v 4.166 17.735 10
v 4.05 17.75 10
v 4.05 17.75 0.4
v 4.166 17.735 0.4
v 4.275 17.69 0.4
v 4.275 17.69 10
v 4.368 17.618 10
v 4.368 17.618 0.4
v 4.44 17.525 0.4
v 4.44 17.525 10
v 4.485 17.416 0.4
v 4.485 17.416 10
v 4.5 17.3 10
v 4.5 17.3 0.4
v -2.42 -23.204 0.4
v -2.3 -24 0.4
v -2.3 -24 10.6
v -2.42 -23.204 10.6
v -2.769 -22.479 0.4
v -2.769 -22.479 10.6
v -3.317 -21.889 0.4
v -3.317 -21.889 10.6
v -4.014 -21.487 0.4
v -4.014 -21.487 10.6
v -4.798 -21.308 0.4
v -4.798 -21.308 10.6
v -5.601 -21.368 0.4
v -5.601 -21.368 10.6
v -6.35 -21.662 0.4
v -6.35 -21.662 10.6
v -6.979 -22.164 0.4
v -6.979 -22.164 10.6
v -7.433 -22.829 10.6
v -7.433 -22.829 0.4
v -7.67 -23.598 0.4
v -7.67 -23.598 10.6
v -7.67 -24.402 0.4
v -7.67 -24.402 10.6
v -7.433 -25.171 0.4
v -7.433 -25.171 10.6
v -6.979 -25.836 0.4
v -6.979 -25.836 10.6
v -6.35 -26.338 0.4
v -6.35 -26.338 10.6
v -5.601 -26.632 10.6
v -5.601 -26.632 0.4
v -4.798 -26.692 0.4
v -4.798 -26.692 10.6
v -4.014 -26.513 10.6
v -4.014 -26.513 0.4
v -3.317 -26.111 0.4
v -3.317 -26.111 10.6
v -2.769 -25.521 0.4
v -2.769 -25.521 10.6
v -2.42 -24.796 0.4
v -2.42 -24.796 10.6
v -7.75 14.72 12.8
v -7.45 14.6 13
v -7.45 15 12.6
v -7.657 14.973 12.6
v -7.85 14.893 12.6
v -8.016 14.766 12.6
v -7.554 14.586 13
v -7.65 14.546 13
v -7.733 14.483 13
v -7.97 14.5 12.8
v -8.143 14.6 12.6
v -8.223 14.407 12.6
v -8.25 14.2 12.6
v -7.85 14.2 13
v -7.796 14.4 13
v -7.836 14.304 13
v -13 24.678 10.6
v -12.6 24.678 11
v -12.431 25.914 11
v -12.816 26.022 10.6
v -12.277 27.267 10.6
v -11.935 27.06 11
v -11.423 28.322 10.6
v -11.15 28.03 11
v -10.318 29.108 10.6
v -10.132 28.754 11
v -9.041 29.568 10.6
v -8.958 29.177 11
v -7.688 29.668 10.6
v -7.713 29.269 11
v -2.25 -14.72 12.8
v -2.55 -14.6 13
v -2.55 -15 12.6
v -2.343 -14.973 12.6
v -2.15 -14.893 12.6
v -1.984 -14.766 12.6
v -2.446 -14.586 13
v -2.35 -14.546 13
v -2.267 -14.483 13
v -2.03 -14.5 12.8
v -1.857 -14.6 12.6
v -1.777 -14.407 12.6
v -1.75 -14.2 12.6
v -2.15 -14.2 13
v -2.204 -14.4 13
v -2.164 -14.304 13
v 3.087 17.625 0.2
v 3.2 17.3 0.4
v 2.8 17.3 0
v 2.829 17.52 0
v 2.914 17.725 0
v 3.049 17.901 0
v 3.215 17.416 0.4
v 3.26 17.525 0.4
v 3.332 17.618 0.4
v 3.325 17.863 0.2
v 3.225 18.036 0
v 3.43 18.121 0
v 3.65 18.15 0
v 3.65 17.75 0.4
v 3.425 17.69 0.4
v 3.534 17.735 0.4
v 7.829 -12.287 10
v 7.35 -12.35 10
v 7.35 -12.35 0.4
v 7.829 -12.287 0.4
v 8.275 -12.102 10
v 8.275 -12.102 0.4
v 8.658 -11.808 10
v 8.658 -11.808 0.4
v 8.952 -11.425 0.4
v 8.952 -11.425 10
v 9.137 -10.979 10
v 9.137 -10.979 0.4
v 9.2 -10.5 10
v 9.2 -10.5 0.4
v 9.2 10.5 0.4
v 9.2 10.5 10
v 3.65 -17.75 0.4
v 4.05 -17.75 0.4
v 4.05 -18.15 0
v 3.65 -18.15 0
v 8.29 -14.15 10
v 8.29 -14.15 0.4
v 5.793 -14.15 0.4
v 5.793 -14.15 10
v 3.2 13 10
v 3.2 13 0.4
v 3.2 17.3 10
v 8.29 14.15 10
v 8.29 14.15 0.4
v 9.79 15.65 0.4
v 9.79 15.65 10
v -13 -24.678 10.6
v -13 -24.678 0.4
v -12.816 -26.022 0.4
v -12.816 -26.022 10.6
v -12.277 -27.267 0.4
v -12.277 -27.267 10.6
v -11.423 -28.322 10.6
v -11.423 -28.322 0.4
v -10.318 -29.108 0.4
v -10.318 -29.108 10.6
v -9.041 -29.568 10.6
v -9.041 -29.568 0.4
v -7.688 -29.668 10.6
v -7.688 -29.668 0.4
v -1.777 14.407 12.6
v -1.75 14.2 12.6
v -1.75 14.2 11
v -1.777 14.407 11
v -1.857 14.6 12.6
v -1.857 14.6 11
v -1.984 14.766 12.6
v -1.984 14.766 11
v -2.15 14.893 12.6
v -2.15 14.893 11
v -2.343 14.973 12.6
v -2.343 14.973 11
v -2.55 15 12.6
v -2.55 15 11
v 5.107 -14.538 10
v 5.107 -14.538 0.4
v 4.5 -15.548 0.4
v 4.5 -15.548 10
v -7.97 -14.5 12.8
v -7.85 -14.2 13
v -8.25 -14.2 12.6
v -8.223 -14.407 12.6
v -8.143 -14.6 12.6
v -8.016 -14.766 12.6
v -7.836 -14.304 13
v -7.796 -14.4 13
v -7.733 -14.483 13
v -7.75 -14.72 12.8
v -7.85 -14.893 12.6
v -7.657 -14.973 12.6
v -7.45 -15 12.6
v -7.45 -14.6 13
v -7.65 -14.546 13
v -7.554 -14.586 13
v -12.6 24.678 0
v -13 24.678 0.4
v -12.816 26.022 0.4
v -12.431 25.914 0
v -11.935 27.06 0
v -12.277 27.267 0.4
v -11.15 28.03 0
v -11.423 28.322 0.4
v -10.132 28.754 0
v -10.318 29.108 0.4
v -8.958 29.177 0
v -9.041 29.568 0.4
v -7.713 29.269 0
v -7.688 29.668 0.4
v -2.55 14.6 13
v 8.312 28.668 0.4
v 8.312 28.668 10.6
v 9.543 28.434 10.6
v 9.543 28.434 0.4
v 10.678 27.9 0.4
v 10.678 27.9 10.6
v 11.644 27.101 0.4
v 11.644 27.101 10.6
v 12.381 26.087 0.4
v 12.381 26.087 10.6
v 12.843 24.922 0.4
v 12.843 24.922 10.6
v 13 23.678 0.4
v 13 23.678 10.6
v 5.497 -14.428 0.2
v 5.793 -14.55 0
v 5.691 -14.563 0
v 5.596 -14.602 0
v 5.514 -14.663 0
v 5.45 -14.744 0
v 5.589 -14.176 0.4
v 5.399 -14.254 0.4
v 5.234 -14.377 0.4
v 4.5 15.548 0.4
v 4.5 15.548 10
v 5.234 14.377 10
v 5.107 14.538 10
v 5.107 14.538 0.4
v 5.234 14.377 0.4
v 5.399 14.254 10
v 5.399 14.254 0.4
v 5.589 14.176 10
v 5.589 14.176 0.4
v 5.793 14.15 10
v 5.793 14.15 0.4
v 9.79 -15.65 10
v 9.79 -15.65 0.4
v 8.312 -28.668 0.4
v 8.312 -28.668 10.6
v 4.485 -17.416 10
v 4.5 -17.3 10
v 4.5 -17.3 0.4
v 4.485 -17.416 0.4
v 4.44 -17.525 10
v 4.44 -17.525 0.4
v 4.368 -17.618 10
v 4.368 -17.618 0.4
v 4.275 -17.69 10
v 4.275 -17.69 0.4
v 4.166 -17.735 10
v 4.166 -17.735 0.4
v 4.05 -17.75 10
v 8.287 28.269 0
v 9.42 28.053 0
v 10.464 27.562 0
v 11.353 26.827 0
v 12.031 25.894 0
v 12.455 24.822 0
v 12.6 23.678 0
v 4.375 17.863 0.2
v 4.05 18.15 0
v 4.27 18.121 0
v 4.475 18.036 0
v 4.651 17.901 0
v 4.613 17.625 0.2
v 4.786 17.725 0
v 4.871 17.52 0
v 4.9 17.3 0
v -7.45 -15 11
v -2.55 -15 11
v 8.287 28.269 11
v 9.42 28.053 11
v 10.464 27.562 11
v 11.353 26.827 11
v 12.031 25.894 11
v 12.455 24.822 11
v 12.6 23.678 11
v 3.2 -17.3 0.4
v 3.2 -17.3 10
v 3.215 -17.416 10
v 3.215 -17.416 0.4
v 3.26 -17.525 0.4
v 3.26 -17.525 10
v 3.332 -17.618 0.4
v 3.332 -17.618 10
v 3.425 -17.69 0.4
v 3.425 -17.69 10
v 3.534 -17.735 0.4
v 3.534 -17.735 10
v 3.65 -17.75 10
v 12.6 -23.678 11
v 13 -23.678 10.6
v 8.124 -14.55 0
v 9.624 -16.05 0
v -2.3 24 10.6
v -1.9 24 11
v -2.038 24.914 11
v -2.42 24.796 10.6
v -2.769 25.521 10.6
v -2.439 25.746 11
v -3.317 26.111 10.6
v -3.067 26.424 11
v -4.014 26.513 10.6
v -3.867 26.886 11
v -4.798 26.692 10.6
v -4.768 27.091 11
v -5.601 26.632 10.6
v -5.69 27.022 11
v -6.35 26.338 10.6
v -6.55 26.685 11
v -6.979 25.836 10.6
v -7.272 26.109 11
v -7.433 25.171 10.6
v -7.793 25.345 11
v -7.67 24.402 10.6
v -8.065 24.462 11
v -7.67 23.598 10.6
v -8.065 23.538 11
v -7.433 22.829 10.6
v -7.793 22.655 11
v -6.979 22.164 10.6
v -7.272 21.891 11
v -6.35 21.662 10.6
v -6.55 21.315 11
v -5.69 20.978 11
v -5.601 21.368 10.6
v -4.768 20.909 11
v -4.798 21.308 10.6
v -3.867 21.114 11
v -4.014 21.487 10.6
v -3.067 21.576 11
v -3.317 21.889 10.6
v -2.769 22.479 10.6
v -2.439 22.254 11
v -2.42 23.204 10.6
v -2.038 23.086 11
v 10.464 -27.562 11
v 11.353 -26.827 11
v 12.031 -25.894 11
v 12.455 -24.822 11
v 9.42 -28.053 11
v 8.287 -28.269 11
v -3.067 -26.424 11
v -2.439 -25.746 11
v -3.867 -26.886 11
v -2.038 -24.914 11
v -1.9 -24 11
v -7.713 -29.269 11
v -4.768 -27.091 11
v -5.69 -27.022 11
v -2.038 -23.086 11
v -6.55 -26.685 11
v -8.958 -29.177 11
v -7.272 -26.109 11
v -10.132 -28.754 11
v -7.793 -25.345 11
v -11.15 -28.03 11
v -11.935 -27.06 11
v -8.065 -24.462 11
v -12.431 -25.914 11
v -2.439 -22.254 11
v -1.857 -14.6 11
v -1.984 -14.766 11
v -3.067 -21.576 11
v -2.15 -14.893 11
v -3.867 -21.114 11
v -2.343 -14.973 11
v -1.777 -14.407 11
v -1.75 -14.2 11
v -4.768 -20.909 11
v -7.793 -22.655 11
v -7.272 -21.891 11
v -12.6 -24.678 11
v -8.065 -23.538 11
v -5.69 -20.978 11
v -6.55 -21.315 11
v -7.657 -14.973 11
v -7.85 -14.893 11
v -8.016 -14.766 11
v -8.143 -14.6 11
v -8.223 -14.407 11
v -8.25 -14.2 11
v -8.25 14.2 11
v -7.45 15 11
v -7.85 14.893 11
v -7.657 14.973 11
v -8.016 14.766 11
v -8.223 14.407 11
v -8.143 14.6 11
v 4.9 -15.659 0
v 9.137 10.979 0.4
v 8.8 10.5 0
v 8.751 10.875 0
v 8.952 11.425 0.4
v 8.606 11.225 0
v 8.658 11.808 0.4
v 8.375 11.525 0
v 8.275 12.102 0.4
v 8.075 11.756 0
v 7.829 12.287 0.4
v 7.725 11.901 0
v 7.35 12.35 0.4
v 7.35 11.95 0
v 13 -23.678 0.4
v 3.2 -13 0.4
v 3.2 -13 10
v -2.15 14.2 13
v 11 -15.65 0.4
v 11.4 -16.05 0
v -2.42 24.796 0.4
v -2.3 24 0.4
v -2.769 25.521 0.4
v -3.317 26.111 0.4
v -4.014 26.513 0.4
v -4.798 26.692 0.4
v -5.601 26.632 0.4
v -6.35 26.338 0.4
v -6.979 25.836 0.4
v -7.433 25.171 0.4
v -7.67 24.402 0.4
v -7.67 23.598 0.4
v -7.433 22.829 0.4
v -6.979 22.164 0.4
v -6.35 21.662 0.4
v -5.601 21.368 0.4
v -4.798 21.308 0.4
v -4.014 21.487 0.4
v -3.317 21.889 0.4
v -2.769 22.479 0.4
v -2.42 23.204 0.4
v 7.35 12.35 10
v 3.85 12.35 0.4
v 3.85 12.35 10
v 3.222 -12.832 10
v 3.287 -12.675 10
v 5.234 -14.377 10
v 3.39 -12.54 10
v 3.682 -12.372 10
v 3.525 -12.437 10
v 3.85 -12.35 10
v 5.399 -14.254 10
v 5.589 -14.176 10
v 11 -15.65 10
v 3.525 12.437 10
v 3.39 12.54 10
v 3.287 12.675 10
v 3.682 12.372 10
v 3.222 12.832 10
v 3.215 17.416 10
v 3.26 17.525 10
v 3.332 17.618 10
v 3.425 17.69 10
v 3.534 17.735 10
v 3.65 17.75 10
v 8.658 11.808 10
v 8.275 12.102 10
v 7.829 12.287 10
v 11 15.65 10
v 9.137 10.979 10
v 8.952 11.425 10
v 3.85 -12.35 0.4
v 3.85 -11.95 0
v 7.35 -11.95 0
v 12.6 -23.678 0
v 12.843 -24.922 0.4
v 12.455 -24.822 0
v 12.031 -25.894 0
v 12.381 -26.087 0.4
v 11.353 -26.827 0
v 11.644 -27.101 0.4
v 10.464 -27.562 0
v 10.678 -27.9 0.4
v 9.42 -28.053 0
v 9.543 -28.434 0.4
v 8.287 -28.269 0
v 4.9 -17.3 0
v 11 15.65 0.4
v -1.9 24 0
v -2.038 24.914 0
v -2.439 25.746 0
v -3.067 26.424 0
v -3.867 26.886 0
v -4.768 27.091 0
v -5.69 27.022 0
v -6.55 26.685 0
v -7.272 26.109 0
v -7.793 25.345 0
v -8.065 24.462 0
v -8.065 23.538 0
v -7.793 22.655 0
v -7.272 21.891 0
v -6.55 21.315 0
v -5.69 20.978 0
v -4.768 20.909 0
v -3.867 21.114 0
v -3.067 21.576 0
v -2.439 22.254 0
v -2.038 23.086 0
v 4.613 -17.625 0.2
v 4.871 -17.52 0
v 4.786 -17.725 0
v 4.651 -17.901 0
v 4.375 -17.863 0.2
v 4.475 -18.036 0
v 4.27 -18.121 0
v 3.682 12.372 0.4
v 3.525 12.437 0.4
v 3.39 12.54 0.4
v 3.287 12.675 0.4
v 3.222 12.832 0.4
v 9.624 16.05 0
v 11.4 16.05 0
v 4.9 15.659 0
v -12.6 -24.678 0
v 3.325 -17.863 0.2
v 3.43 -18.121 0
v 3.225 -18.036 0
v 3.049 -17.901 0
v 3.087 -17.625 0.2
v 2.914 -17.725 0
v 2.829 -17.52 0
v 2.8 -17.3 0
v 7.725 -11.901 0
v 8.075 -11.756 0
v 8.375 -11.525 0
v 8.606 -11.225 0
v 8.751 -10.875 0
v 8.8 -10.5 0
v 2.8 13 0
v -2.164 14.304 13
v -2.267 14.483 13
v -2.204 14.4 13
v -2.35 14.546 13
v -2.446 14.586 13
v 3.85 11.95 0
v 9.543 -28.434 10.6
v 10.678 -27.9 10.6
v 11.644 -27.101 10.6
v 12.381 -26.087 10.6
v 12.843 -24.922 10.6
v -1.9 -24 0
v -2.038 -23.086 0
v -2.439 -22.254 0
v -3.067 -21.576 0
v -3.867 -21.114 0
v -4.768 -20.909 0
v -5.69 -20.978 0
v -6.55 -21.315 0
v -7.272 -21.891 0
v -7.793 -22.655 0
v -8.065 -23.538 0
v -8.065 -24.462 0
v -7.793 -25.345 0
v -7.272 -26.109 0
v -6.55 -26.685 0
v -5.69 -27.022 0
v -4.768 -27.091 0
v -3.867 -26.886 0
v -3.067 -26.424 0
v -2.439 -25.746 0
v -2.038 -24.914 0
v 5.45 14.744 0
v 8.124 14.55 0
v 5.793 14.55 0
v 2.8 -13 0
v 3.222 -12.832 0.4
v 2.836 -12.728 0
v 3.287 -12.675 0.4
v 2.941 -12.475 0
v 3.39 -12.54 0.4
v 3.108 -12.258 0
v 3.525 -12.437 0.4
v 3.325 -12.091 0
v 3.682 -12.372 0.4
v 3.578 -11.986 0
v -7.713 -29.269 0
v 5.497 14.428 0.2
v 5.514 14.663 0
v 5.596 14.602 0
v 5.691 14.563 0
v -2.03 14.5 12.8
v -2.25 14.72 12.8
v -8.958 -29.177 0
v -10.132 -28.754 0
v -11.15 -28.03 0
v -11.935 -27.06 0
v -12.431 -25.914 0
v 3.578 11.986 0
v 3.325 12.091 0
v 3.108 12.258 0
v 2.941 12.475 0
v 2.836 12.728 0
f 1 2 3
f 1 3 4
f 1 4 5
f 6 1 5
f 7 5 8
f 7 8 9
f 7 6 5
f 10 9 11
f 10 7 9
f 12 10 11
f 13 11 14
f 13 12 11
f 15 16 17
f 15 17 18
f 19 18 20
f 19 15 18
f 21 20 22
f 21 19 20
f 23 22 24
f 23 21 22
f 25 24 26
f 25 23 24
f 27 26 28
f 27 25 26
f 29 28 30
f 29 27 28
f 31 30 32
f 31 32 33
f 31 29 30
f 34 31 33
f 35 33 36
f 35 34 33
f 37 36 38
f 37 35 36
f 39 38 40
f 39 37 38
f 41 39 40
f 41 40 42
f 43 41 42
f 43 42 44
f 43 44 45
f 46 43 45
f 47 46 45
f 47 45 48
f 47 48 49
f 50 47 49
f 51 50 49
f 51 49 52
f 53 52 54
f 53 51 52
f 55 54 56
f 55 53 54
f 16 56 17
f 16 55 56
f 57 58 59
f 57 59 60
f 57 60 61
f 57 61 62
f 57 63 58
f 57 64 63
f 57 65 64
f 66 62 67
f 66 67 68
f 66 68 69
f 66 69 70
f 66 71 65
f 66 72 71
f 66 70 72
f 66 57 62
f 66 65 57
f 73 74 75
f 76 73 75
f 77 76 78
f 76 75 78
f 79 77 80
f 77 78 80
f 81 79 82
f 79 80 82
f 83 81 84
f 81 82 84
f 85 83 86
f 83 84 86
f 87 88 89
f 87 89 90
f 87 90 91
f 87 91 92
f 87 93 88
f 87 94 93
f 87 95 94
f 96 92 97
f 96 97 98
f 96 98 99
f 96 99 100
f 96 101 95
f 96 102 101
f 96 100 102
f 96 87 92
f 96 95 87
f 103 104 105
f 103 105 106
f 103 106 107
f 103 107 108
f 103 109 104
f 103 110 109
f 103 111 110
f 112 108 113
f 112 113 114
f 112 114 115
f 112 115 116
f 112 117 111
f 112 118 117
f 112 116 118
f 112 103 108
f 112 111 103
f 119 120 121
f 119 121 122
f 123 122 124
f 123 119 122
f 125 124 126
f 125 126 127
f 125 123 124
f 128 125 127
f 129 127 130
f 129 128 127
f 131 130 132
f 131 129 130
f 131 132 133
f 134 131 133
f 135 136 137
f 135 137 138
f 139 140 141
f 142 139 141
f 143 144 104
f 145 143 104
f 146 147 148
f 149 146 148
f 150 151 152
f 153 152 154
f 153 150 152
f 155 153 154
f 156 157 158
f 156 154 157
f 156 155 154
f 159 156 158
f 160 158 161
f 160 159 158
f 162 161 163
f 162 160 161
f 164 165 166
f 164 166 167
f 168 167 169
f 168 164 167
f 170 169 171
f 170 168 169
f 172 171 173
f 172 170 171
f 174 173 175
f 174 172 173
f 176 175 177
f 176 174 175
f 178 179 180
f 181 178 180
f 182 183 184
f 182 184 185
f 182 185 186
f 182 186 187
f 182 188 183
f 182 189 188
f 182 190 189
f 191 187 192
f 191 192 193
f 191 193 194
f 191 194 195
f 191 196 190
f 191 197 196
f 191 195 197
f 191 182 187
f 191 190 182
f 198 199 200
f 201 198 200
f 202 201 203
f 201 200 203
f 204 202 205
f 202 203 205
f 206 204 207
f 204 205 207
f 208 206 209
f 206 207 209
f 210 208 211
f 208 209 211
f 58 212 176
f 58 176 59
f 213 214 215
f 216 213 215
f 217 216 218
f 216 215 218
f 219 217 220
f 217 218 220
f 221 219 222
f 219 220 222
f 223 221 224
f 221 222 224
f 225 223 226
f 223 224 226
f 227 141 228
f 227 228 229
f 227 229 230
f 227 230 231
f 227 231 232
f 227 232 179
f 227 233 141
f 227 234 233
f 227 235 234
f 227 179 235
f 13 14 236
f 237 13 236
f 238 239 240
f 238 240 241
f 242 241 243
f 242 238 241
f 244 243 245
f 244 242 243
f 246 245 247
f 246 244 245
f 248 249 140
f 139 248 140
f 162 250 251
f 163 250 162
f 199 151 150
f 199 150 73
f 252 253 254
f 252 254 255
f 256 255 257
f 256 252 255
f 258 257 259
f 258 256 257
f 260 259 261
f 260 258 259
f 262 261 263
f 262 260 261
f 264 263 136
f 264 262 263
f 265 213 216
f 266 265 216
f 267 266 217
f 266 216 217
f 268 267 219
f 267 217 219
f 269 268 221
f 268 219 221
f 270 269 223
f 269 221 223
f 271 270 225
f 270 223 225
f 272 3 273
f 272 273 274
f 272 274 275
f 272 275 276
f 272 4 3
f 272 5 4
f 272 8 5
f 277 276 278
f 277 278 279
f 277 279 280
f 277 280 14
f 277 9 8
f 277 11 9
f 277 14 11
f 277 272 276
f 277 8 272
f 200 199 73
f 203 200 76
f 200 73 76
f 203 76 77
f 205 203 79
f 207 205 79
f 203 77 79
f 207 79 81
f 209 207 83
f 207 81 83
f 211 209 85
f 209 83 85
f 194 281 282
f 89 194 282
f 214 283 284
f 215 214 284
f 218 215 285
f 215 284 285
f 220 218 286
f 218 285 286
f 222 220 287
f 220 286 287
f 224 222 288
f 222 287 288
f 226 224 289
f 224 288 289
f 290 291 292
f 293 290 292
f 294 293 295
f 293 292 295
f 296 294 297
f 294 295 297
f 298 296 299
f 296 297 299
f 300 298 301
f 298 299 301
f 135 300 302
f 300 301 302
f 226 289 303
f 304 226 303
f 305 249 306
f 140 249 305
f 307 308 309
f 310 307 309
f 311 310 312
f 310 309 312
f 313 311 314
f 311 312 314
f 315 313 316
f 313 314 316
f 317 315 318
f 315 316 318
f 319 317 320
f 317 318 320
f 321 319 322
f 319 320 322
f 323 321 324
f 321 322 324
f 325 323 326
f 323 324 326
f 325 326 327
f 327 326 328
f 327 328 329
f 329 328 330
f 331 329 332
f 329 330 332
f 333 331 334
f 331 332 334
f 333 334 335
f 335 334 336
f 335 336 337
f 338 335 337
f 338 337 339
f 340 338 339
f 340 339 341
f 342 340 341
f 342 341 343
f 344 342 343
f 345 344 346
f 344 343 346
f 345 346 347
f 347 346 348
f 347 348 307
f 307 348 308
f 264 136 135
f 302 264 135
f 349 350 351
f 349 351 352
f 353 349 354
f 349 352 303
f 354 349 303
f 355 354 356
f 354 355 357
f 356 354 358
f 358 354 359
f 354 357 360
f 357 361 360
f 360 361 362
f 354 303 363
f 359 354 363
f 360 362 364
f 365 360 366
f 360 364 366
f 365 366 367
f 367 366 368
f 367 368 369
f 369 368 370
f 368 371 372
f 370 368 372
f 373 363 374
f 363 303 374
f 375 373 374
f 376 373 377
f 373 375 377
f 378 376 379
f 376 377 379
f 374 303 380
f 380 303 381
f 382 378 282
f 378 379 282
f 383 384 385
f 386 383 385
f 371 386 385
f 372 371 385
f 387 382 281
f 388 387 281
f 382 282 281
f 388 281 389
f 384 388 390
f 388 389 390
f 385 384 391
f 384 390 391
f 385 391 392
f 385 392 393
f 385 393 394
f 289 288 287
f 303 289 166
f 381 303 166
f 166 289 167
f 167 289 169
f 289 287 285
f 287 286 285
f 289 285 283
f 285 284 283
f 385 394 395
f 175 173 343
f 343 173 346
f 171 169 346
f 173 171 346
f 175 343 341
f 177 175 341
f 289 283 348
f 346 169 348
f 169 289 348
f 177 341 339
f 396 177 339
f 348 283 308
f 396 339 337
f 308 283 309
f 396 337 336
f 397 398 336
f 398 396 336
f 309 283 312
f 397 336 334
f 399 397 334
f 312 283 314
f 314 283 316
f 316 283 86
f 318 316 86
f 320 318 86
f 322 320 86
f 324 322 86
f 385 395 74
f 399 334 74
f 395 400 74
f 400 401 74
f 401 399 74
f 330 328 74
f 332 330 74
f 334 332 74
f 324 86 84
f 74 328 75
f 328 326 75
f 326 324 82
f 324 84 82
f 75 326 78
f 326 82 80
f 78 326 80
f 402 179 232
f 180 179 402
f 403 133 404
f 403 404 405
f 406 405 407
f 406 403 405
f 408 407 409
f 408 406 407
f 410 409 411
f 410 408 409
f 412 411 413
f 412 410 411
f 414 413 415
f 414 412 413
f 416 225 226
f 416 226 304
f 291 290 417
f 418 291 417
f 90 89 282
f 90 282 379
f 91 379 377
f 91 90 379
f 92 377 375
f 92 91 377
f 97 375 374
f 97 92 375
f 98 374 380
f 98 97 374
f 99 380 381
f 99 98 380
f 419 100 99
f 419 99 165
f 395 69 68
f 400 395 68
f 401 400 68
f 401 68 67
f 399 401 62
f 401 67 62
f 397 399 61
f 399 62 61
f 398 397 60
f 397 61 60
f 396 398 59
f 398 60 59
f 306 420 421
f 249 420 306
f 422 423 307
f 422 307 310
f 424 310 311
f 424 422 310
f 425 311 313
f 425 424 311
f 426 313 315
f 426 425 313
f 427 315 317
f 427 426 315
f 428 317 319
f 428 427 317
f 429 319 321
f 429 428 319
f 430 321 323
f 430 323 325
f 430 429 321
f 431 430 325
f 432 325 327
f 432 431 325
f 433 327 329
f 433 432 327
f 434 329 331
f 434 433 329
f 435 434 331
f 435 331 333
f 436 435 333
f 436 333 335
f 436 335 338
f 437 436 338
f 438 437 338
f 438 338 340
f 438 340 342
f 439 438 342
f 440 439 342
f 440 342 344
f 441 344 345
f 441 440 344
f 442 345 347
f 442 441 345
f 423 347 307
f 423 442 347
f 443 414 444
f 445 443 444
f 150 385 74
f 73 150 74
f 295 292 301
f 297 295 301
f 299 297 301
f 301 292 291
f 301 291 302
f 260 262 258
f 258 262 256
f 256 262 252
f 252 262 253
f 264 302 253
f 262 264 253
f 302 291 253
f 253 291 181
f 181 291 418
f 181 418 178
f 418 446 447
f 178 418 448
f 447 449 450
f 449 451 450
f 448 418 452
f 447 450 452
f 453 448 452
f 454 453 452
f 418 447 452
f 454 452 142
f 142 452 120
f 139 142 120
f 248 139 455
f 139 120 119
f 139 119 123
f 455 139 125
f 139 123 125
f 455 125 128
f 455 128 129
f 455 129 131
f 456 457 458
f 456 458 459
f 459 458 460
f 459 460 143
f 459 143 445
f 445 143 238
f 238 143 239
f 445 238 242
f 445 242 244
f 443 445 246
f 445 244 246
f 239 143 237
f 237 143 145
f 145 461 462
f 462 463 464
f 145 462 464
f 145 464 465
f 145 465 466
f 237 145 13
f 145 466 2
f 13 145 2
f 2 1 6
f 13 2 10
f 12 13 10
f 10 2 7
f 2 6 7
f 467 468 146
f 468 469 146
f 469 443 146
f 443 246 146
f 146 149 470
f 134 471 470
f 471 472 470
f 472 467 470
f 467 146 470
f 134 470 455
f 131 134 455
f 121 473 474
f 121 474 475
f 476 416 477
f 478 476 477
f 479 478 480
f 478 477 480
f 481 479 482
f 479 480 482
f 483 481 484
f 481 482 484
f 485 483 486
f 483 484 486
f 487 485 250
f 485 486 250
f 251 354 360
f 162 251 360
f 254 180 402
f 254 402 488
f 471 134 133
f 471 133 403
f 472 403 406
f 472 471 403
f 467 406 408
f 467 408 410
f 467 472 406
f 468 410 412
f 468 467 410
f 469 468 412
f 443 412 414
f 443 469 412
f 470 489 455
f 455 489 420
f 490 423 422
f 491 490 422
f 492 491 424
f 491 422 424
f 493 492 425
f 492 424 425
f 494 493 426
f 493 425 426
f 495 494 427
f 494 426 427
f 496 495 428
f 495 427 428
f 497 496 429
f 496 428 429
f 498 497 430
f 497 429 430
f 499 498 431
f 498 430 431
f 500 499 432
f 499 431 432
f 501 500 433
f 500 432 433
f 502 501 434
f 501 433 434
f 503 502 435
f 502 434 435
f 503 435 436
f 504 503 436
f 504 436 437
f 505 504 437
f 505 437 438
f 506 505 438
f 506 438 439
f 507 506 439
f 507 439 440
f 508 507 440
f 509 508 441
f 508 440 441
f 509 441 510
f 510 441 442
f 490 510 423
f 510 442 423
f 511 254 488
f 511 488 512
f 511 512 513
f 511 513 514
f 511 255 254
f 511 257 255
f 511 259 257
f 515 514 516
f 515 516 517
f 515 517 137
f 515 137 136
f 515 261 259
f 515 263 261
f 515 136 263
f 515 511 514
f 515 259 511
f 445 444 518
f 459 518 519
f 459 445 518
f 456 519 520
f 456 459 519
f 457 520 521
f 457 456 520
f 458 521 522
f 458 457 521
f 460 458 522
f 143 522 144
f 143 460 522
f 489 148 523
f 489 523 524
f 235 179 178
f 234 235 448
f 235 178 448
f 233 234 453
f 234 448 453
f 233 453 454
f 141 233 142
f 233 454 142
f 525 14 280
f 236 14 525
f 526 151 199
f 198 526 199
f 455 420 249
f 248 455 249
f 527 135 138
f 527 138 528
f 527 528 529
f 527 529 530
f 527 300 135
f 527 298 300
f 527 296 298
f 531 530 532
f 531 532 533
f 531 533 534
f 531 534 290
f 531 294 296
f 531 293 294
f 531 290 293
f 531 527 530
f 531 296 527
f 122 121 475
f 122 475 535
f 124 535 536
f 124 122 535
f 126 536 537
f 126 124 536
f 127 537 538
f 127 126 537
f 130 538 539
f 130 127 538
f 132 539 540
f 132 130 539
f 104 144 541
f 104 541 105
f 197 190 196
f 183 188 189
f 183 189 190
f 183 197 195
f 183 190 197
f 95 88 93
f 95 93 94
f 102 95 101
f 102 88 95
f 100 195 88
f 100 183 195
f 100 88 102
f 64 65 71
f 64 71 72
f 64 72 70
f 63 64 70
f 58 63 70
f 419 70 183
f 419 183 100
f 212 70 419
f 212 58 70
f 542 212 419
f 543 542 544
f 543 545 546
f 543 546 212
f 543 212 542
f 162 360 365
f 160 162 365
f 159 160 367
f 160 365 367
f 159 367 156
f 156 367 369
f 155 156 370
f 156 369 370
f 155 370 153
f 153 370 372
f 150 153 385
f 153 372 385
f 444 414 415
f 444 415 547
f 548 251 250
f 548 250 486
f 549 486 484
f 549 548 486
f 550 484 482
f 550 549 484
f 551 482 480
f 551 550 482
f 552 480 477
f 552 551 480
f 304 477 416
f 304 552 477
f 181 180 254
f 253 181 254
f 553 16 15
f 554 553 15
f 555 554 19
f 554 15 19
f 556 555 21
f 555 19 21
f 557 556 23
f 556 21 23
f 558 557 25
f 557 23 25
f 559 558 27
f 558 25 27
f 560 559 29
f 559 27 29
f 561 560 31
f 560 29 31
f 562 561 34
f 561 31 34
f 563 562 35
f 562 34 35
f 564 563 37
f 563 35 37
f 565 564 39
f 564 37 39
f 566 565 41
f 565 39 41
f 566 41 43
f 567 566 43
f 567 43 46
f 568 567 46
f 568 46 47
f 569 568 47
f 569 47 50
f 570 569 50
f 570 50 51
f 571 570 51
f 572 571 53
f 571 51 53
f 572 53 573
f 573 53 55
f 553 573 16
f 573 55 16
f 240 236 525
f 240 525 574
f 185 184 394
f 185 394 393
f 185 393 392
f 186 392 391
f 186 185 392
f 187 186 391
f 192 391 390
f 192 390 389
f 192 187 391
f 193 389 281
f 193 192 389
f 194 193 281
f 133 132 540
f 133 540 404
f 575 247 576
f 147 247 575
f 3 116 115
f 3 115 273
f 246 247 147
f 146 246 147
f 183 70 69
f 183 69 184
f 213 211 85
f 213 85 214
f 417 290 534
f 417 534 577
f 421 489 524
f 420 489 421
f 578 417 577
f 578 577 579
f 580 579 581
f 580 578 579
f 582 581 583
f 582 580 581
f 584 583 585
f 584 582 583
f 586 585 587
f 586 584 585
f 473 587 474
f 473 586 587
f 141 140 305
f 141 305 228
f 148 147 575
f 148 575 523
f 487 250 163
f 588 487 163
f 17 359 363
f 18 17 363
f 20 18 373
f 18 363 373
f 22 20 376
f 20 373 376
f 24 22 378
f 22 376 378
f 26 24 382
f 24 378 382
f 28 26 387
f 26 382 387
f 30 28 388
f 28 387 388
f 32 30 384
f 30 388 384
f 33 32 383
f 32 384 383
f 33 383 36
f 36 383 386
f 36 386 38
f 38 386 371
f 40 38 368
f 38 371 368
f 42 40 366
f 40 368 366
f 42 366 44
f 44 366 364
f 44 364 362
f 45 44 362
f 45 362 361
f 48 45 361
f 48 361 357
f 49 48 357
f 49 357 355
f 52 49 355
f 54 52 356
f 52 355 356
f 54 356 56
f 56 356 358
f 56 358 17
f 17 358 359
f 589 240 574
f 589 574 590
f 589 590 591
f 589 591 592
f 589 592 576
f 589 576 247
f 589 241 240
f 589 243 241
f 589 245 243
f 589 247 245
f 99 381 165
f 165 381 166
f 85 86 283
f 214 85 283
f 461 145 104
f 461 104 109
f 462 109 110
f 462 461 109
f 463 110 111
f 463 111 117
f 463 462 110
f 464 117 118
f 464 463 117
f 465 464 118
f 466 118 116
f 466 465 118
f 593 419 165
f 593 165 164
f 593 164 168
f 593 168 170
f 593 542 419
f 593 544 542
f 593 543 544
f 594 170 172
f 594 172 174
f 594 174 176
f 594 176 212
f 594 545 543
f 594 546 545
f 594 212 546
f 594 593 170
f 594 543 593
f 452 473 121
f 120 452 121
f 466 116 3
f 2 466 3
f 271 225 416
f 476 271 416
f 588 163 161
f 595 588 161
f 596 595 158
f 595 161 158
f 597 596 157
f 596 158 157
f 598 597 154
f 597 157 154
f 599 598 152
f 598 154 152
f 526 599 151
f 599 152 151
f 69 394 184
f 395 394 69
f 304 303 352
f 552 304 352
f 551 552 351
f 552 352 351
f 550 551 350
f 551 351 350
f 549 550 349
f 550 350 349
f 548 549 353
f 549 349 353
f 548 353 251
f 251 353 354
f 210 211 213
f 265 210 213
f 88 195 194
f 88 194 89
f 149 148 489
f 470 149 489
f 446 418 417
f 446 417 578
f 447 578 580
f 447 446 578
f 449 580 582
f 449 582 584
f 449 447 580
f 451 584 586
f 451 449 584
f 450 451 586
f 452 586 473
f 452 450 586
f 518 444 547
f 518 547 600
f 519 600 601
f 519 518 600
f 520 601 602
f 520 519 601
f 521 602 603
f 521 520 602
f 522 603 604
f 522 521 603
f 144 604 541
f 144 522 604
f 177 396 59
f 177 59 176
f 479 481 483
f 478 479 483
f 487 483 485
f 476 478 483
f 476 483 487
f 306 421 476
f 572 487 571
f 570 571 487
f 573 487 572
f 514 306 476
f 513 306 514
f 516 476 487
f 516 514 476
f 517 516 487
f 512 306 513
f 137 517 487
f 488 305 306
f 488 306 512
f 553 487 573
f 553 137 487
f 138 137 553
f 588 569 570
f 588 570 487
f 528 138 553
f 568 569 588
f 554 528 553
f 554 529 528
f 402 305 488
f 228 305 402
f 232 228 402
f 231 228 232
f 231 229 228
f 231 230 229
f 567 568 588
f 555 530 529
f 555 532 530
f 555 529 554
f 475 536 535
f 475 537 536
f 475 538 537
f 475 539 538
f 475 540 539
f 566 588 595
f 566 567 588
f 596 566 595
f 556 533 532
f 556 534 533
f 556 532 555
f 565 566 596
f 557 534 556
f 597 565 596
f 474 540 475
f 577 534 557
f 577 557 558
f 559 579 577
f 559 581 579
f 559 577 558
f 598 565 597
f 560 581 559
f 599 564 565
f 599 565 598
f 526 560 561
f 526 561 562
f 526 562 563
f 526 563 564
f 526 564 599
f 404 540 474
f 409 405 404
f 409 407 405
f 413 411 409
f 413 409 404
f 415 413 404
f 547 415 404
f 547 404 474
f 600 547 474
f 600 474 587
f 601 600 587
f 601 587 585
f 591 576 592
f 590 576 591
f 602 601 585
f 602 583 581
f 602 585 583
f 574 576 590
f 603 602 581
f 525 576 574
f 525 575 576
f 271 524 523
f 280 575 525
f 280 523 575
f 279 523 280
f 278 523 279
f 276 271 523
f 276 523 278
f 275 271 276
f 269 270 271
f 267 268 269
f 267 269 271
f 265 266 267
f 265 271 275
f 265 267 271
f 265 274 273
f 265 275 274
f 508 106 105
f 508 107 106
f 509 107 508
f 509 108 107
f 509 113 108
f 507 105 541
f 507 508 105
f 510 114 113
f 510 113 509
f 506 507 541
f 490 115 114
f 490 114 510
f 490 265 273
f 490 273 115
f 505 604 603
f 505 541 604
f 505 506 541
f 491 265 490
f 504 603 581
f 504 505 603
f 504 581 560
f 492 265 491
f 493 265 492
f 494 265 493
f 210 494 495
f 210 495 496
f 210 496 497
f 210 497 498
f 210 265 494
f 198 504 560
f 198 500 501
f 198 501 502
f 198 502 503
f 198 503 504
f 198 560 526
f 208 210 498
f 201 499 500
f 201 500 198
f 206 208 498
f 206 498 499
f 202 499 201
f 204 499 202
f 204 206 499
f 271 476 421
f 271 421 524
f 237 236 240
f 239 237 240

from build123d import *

# Parameters (mm, degrees)
SKETCH1_R           = 2.7
BOSS_EXTRUDE1_DEPTH = 11
SKETCH2_W           = 6.5
SKETCH2_H           = 30
BOSS_EXTRUDE2_DEPTH = 2
SKETCH3_W           = 7.8
SKETCH3_H           = 35.5
BOSS_EXTRUDE3_DEPTH = 1
FILLET1_R           = 5
FILLET2_R           = 0.45
FILLET3_R           = 0.8
FILLET4_R           = 0.65
FILLET5_R           = 1.85
CHAMFER1_SIZE       = 0.4


with BuildPart() as part:
    # Sketch1 → Boss-Extrude1 (new body)
    with BuildSketch(Plane.XY):
        Polygon((-13, -30), (-13, 30), (13, 28.375), (13, -28.375), align=None)
        with Locations((-5, -24)):
            Circle(SKETCH1_R, mode=Mode.SUBTRACT)
        with Locations((-5, 24)):
            Circle(SKETCH1_R, mode=Mode.SUBTRACT)
        Polygon((3.2, -17.75), (3.2, -12.35), (9.2, -12.35), (9.2, 12.35), (3.2, 12.35), (3.2, 17.75), (4.5, 17.75), (4.5, 15.547994765), (5.34, 14.15), (8.29, 14.15), (9.79, 15.65), (11, 15.65), (11, -15.65), (9.79, -15.65), (8.29, -14.15), (5.34, -14.15), (4.5, -15.547994765), (4.5, -17.75), align=None, mode=Mode.SUBTRACT)
    extrude(amount=BOSS_EXTRUDE1_DEPTH)

    # Sketch2 → Boss-Extrude2 (add)
    with BuildSketch(Plane.XY.offset(11)):
        with Locations((-5, 0)):
            Rectangle(SKETCH2_W, SKETCH2_H)
    extrude(amount=BOSS_EXTRUDE2_DEPTH)

    # Sketch3 → Boss-Extrude3 (add)
    with BuildSketch(Plane.XY.offset(11)):
        with Locations((7.1, 0)):
            Rectangle(SKETCH3_W, SKETCH3_H)
    extrude(amount=-BOSS_EXTRUDE3_DEPTH)

    # Fillet1
    fillet1_edges = [part.edges().sort_by_distance(p)[0] for p in [
        (-13, -30, 5.5),
        (-13, 30, 5.5),
        (13, 28.375, 5.5),
        (13, -28.375, 5.5),
    ]]
    fillet(fillet1_edges, radius=FILLET1_R)

    # Fillet2
    fillet2_edges = [part.edges().sort_by_distance(p)[0] for p in [
        (3.2, 17.75, 5),
        (4.5, 17.75, 5),
        (4.5, -17.75, 5),
        (3.2, -17.75, 5),
    ]]
    fillet(fillet2_edges, radius=FILLET2_R)

    # Fillet3
    fillet3_edges = [part.edges().sort_by_distance(p)[0] for p in [
        (5.34, 14.15, 5),
        (5.34, -14.15, 5),
        (-8.25, 15, 12),
        (-8.25, -15, 12),
        (-1.75, -15, 12),
        (-1.75, 15, 12),
    ]]
    fillet(fillet3_edges, radius=FILLET3_R)

    # Fillet4
    fillet4_edges = [part.edges().sort_by_distance(p)[0] for p in [
        (3.2, 12.35, 5),
        (3.2, -12.35, 5),
    ]]
    fillet(fillet4_edges, radius=FILLET4_R)

    # Fillet5
    fillet5_edges = [part.edges().sort_by_distance(p)[0] for p in [
        (9.2, -12.35, 5),
        (9.2, 12.35, 5),
    ]]
    fillet(fillet5_edges, radius=FILLET5_R)

    # Chamfer1
    chamfer1_edges = [part.edges().sort_by_distance(p)[0] for p in [
        (-7.7, -24, 0),
        (-7.7, -24, 11),
        (0.311891431, -29.168006786, 0),
        (0.311891431, -29.168006786, 11),
        (-13, 0, 0),
        (0.311891431, 29.168006786, 0),
        (13, 0, 0),
        (-11.423488195, 28.321880084, 0),
        (11.644136191, 27.101232088, 0),
        (11.644136191, -27.101232088, 0),
        (-11.423488195, -28.321880084, 0),
        (-13, 0, 11),
        (13, 0, 11),
        (0.311891431, 29.168006786, 11),
        (-11.423488195, 28.321880084, 11),
        (-7.7, 24, 0),
        (11.644136191, 27.101232088, 11),
        (11.644136191, -27.101232088, 11),
        (-11.423488195, -28.321880084, 11),
        (-7.7, 24, 11),
        (3.85, 17.75, 0),
        (3.2, 15.15, 0),
        (3.85, -17.75, 0),
        (4.5, -16.423997383, 0),
        (4.368198052, 17.618198052, 0),
        (3.331801948, 17.618198052, 0),
        (4.368198052, -17.618198052, 0),
        (3.331801948, -17.618198052, 0),
        (-5, -15, 13),
        (-8.25, 0, 13),
        (-1.75, 0, 13),
        (-5, 15, 13),
        (-1.984314575, -14.765685425, 13),
        (-8.015685425, 14.765685425, 13),
        (-1.984314575, 14.765685425, 13),
        (-8.015685425, -14.765685425, 13),
        (7.041309111, -14.15, 0),
        (4.803442191, 15.042982153, 0),
        (5.398679374, -14.253715443, 0),
        (5.398679374, 14.253715443, 0),
        (5.6, 12.35, 0),
        (3.2, -15.15, 0),
        (3.390380592, 12.540380592, 0),
        (3.390380592, -12.540380592, 0),
        (9.2, 0, 0),
        (5.6, -12.35, 0),
        (8.658147545, -11.808147545, 0),
        (8.658147545, 11.808147545, 0),
        (4.803442191, -15.042982153, 0),
        (9.04, -14.9, 0),
        (10.395, -15.65, 0),
        (11, 0, 0),
        (10.395, 15.65, 0),
        (9.04, 14.9, 0),
        (7.041309111, 14.15, 0),
        (4.5, 16.423997383, 0),
    ]]
    chamfer(chamfer1_edges, length=CHAMFER1_SIZE)


solid = part.part
